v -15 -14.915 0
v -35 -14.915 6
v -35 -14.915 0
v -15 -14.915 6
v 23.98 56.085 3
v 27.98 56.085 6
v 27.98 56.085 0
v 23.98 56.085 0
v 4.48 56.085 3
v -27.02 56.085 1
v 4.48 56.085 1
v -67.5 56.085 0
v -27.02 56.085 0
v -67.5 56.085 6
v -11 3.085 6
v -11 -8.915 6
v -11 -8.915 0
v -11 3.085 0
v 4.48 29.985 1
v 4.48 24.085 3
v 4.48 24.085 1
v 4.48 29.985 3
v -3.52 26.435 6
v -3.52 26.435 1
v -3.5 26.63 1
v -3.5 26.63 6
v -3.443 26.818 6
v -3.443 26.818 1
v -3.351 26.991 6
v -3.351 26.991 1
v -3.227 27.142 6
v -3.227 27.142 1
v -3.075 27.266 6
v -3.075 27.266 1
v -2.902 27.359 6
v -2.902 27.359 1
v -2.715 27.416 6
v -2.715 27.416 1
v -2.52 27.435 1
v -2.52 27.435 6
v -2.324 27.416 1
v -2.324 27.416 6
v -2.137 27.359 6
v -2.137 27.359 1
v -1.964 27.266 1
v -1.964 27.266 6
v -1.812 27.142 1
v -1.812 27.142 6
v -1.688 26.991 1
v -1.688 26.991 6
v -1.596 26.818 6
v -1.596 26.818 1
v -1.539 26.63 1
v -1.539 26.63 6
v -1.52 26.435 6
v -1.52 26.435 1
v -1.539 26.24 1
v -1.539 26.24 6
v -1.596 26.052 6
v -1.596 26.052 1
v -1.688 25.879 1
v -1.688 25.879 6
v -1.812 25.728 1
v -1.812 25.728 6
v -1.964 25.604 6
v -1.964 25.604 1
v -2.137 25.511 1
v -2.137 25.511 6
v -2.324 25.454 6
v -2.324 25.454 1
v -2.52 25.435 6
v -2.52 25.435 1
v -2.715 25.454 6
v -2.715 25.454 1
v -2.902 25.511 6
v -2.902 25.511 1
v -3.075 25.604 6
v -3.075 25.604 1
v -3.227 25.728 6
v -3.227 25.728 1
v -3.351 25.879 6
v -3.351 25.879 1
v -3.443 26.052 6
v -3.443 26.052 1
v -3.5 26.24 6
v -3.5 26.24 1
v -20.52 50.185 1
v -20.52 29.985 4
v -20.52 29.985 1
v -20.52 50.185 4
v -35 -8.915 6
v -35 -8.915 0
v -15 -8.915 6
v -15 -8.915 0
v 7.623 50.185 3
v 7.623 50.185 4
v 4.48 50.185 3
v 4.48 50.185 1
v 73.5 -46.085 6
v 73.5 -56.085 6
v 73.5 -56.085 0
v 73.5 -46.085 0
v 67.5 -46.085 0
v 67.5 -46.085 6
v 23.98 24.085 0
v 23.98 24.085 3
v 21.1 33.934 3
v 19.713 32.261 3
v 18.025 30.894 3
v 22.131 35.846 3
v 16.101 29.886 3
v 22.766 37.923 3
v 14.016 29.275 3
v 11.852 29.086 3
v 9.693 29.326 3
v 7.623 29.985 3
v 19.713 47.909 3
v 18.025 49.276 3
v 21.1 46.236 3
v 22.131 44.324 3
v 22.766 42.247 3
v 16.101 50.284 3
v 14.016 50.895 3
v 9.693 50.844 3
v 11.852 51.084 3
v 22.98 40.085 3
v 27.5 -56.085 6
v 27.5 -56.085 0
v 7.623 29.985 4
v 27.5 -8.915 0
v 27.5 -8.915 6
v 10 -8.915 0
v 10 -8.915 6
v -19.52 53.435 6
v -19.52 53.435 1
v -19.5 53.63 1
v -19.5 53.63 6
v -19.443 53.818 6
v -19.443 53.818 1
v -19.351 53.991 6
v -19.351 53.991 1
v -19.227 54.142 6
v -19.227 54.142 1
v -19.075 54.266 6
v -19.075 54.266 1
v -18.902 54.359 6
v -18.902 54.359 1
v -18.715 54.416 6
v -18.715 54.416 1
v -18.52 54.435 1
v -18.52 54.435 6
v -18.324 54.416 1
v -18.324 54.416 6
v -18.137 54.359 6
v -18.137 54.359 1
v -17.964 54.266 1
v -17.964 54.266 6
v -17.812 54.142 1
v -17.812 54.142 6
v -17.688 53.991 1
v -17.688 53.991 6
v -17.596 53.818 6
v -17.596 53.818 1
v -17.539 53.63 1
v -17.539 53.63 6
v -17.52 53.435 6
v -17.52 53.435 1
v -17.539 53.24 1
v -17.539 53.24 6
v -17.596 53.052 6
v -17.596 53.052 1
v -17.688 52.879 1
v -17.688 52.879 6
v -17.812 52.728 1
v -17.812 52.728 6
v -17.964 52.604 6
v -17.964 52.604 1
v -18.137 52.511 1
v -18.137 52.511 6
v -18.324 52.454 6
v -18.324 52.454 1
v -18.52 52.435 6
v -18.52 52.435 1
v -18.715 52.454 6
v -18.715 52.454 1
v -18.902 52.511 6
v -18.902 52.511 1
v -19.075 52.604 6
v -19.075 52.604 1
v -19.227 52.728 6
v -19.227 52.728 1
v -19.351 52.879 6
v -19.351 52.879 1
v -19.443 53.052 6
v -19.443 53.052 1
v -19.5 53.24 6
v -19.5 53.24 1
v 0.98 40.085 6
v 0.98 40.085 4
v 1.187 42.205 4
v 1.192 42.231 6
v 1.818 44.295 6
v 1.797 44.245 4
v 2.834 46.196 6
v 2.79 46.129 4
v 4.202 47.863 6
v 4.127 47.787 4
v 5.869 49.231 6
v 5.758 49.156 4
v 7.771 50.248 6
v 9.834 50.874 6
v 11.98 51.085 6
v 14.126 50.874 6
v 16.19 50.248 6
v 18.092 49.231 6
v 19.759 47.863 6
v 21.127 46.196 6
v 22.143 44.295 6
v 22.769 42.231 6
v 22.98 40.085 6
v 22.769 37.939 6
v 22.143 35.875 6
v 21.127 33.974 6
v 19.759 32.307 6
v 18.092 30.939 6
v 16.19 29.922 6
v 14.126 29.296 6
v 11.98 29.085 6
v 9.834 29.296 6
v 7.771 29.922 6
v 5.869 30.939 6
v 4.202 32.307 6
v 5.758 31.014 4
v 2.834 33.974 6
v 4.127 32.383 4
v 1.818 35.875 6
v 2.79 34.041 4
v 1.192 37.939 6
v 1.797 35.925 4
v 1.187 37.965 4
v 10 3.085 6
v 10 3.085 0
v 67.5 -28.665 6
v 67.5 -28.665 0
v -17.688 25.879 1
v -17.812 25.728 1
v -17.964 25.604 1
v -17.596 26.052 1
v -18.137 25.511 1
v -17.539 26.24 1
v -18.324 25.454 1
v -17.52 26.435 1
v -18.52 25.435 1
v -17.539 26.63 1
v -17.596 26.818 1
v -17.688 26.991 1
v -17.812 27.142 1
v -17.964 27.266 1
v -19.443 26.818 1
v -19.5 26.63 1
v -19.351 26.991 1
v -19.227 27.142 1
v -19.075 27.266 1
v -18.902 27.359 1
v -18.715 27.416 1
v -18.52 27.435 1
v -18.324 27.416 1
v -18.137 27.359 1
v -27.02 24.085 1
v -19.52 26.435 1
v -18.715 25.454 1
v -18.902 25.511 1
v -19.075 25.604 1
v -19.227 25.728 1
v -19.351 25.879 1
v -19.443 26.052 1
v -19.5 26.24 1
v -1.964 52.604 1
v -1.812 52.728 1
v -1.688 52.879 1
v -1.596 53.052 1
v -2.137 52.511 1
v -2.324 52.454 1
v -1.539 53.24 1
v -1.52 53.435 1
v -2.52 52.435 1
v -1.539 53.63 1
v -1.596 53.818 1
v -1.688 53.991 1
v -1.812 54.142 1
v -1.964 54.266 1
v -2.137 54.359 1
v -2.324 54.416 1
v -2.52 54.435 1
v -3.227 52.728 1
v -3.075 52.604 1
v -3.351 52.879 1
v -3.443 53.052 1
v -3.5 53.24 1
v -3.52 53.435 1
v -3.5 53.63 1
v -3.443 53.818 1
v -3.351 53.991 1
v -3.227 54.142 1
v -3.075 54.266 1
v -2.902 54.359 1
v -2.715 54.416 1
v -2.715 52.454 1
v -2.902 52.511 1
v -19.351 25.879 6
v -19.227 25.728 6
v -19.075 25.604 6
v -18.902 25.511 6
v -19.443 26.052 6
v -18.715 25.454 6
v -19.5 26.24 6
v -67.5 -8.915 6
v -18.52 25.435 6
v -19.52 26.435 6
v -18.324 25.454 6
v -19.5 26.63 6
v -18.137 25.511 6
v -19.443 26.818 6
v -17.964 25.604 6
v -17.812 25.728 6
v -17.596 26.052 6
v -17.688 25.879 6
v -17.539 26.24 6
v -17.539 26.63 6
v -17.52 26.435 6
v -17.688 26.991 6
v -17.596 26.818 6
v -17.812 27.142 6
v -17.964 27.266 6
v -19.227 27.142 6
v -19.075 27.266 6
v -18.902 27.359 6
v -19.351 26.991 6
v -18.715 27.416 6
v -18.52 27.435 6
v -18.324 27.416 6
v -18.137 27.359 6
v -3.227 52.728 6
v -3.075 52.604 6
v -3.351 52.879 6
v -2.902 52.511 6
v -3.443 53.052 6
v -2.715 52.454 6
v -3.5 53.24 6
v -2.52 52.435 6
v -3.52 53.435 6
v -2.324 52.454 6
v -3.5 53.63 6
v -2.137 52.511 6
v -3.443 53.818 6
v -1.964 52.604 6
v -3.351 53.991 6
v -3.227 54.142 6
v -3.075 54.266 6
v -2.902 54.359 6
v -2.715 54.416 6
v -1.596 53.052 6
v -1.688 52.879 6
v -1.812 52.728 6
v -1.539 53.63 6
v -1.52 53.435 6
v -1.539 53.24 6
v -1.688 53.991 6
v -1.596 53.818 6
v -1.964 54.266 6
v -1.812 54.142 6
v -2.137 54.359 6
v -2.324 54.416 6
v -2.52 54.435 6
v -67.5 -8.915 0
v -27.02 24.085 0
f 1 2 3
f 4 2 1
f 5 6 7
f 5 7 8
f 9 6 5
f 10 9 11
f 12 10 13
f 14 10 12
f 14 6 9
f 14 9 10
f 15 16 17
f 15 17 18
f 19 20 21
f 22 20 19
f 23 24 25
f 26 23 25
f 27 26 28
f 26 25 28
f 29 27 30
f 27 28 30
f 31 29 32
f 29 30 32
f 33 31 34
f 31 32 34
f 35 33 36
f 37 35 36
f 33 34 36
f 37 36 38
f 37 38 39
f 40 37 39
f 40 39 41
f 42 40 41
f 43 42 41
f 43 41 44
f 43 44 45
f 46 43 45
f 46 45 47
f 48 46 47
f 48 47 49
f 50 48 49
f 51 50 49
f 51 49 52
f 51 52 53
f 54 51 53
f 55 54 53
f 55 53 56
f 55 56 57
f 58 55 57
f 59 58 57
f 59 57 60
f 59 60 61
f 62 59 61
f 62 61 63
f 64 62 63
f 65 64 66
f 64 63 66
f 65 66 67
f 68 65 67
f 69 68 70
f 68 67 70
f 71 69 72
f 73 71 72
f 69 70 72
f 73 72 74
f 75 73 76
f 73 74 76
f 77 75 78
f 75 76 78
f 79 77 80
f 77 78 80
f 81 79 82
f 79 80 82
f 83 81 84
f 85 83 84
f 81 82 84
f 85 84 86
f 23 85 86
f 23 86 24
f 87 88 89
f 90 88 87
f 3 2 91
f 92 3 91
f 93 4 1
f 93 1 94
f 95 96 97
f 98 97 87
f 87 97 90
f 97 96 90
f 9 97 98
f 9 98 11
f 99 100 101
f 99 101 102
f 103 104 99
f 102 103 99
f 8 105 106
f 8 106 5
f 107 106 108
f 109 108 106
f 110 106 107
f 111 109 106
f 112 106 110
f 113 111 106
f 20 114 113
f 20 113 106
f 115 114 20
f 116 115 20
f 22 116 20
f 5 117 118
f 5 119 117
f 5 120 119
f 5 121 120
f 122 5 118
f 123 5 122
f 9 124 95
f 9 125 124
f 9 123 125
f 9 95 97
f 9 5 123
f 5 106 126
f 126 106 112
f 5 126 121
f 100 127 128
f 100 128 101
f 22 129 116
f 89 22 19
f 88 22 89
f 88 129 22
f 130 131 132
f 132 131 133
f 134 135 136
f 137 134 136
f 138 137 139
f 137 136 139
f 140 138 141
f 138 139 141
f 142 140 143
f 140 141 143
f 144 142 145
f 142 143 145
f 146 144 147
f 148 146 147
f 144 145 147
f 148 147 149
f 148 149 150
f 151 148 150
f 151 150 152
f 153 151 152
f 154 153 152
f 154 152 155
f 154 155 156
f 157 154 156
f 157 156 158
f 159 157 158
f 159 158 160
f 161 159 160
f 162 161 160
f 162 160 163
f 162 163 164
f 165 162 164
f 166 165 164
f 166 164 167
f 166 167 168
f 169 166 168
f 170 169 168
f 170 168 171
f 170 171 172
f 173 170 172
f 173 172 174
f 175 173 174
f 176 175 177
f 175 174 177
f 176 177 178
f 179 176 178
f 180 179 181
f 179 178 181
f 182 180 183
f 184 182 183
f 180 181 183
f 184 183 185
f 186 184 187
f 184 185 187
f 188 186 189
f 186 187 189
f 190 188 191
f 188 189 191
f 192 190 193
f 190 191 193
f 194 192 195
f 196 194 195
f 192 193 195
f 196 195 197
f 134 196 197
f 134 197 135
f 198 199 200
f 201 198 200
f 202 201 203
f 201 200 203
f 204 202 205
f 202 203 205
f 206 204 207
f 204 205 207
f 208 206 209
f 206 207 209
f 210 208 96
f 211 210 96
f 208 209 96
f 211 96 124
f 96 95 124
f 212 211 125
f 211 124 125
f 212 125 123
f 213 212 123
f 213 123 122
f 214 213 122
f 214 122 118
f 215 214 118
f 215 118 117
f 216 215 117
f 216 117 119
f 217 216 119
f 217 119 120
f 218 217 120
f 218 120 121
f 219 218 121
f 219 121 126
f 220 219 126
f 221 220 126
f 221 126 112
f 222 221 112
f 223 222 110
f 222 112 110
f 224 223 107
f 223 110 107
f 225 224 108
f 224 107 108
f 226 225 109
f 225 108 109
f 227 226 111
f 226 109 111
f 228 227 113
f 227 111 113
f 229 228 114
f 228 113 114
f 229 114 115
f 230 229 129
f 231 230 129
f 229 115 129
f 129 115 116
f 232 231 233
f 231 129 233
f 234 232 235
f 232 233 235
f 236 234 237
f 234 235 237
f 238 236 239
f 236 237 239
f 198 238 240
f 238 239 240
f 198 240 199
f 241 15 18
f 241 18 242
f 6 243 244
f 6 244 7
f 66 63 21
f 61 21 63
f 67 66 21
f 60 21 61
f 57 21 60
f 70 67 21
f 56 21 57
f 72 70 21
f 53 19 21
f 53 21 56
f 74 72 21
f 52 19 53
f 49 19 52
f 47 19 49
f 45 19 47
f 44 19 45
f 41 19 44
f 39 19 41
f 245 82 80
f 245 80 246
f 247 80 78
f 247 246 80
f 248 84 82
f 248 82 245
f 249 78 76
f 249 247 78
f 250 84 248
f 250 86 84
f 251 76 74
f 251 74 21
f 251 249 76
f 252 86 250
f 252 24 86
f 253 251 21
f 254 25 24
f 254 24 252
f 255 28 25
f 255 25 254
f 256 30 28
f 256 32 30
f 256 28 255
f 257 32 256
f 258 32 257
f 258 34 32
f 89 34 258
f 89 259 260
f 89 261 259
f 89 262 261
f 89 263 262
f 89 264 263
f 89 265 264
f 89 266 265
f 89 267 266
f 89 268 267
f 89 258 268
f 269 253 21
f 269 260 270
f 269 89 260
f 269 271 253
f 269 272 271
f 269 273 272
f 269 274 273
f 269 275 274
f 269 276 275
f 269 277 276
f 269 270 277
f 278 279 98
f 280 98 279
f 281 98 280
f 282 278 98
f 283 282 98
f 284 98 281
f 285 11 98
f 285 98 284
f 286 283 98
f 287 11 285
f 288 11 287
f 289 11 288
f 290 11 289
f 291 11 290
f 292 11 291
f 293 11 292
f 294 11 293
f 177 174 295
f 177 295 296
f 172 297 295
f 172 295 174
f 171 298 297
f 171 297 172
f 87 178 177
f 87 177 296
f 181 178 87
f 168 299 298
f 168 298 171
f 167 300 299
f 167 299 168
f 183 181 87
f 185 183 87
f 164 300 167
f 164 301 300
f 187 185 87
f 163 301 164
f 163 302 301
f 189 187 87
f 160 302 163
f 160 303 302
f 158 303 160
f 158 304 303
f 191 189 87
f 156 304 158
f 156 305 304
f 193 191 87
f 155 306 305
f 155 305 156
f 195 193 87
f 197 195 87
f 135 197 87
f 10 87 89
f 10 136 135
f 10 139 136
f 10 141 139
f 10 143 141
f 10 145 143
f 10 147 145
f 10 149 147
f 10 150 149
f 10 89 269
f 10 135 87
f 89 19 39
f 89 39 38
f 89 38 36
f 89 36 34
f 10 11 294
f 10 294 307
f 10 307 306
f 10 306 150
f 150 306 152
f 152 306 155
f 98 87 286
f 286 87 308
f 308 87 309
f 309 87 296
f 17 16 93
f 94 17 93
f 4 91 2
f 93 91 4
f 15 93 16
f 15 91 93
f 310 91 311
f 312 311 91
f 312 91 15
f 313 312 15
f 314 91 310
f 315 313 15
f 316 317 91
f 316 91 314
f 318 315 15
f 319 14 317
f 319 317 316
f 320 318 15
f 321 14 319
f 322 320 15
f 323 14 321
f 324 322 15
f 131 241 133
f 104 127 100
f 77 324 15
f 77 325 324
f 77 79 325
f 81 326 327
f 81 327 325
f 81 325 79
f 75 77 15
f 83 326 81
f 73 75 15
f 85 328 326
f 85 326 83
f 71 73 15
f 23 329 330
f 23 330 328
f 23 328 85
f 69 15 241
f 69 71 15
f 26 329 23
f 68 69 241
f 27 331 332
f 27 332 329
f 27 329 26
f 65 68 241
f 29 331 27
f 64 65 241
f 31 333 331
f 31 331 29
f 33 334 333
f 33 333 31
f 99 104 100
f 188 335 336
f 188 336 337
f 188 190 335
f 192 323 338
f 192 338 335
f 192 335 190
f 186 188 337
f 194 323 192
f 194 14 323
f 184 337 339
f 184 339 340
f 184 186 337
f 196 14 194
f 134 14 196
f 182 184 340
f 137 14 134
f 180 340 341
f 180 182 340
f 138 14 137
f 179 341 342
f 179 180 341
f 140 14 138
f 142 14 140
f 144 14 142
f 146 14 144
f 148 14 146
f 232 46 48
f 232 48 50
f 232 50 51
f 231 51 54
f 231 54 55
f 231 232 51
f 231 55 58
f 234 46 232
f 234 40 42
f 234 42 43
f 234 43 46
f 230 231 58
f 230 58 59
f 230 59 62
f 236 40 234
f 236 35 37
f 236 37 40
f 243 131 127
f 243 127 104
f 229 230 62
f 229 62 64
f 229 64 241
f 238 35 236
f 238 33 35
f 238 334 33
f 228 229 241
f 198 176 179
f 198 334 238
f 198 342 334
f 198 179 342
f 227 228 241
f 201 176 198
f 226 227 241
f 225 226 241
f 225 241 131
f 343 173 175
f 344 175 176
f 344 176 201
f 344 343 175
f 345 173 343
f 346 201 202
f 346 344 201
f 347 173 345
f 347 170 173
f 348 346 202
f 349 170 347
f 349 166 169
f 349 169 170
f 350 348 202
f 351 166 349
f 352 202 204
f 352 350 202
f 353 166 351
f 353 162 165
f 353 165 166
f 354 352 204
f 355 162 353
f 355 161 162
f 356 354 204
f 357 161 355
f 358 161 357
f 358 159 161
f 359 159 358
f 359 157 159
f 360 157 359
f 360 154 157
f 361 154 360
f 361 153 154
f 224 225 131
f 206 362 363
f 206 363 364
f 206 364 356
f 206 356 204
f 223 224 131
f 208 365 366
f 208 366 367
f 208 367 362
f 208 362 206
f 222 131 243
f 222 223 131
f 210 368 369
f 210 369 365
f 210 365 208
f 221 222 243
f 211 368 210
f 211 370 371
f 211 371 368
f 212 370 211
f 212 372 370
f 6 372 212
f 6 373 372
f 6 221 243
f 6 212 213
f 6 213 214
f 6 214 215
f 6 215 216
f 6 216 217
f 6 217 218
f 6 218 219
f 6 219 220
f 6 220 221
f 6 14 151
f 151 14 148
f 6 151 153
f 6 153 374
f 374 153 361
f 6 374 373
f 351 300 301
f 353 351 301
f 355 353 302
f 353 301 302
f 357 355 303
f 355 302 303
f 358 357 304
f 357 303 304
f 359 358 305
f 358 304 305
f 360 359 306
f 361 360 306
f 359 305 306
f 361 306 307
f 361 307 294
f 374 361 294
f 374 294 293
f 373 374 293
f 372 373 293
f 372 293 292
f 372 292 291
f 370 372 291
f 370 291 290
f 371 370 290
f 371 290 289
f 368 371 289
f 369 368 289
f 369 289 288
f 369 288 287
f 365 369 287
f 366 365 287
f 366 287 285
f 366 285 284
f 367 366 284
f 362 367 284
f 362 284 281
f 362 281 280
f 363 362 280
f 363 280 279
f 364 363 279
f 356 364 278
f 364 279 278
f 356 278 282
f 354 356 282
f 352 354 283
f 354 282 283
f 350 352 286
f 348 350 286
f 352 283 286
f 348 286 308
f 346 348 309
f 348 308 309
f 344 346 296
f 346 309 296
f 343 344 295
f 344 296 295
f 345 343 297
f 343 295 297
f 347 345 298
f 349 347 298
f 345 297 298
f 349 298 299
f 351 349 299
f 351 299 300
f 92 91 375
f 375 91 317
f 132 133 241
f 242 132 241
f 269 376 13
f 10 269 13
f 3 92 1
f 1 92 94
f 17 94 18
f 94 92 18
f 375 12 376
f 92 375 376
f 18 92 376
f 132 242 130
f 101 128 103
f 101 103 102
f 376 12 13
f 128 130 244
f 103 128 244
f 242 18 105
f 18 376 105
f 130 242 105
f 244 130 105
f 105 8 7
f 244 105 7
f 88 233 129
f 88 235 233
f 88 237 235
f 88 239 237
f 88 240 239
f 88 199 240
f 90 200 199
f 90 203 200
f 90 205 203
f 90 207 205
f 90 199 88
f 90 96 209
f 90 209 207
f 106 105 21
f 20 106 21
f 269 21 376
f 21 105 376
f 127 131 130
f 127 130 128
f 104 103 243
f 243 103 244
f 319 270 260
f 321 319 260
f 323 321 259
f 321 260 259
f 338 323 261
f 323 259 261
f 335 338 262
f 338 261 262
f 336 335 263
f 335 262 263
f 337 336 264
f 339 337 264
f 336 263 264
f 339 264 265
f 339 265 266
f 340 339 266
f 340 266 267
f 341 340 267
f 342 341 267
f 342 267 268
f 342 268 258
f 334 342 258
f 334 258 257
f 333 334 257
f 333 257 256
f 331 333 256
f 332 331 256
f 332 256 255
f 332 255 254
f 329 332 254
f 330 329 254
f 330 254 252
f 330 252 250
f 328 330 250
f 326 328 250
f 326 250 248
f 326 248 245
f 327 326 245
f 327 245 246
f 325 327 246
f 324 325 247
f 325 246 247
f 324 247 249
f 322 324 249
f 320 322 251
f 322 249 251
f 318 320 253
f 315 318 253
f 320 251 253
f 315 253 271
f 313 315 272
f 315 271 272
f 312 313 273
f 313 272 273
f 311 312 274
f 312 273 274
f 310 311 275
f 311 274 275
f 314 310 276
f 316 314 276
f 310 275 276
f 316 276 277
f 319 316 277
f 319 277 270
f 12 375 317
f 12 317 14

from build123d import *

# Parameters (mm, degrees)
ESQUISSE1_W             = 135
ESQUISSE1_H             = 112.17
BOSS_EXTRU_1_DEPTH      = 6
ENL_V_MAT_EXTRU_1_DEPTH = 6
ESQUISSE3_W             = 6
ESQUISSE3_H             = 10
ESQUISSE3_W_2           = 20
ESQUISSE3_H_2           = 6
BOSS_EXTRU_2_DEPTH      = 6
ESQUISSE4_W             = 51
ESQUISSE4_H             = 32
ENL_V_MAT_EXTRU_5_DEPTH = 3
ESQUISSE7_R             = 11
ENL_V_MAT_EXTRU_6_DEPTH = 4
ESQUISSE8_W             = 30
ESQUISSE8_H             = 20.2
ENL_V_MAT_EXTRU_7_DEPTH = 1
ESQUISSE9_W             = 25
ESQUISSE9_H             = 5.9
BOSS_EXTRU_4_DEPTH      = 2
ESQUISSE10_W            = 25
ESQUISSE10_H            = 5.9
BOSS_EXTRU_5_DEPTH      = 2
ESQUISSE11_W            = 6.5
ESQUISSE11_H            = 32
BOSS_EXTRU_6_DEPTH      = 2
ESQUISSE12_R            = 1
ENL_V_MAT_EXTRU_8_DEPTH = 6
ESQUISSE13_W            = 21
ESQUISSE13_H            = 12
ENL_V_MAT_EXTRU_9_DEPTH = 6


with BuildPart() as part:
    # Esquisse1 → Boss.-Extru.1 (new body)
    with BuildSketch(Plane.XY):
        Rectangle(ESQUISSE1_W, ESQUISSE1_H)
    extrude(amount=BOSS_EXTRU_1_DEPTH)

    # Esquisse2 → Enlèv. mat.-Extru.1 (cut)
    with BuildSketch(Plane.XY.offset(6)):
        Polygon((27.5, -56.085), (-67.5, -56.085), (-67.5, -8.915), (-38.5, -8.915), (27.5, -8.915), align=None)
        Polygon((67.5, -28.665), (27.980425971, 56.085), (67.5, 56.085), align=None)
    extrude(amount=-ENL_V_MAT_EXTRU_1_DEPTH, mode=Mode.SUBTRACT)

    # Esquisse3 → Boss.-Extru.2 (add)
    with BuildSketch(Plane.XY.offset(6)):
        with Locations((70.5, -51.085)):
            Rectangle(ESQUISSE3_W, ESQUISSE3_H)
        with Locations((-25, -11.915)):
            Rectangle(ESQUISSE3_W_2, ESQUISSE3_H_2)
    extrude(amount=-BOSS_EXTRU_2_DEPTH)

    # Esquisse4 → Enlèv. mat.-Extru.5 (cut)
    with BuildSketch(Plane(origin=(0, 0, 0), x_dir=(-1, 0, 0), z_dir=(0, 0, -1))):
        with Locations((1.519574029, 40.085)):
            Rectangle(ESQUISSE4_W, ESQUISSE4_H)
    extrude(amount=-ENL_V_MAT_EXTRU_5_DEPTH, mode=Mode.SUBTRACT)

    # Esquisse7 → Enlèv. mat.-Extru.6 (cut, through all)
    with BuildSketch(Plane(origin=(0, 0, 3), x_dir=(-1, 0, 0), z_dir=(0, 0, -1))):
        with Locations((-11.980425971, 40.085)):
            Circle(ESQUISSE7_R)
    extrude(amount=-ENL_V_MAT_EXTRU_6_DEPTH, mode=Mode.SUBTRACT)

    # Esquisse8 → Enlèv. mat.-Extru.7 (cut)
    with BuildSketch(Plane(origin=(0, 0, 3), x_dir=(-1, 0, 0), z_dir=(0, 0, -1))):
        with Locations((5.519574029, 40.085)):
            Rectangle(ESQUISSE8_W, ESQUISSE8_H)
    extrude(amount=-ENL_V_MAT_EXTRU_7_DEPTH, mode=Mode.SUBTRACT)

    # Esquisse9 → Boss.-Extru.4 (add)
    with BuildSketch(Plane(origin=(0, 0, 3), x_dir=(-1, 0, 0), z_dir=(0, 0, -1))):
        with Locations((8.019574029, 53.135)):
            Rectangle(ESQUISSE9_W, ESQUISSE9_H)
    extrude(amount=BOSS_EXTRU_4_DEPTH)

    # Esquisse10 → Boss.-Extru.5 (add)
    with BuildSketch(Plane(origin=(0, 0, 3), x_dir=(-1, 0, 0), z_dir=(0, 0, -1))):
        with Locations((8.019574029, 27.035)):
            Rectangle(ESQUISSE10_W, ESQUISSE10_H)
    extrude(amount=BOSS_EXTRU_5_DEPTH)

    # Esquisse11 → Boss.-Extru.6 (add)
    with BuildSketch(Plane(origin=(0, 0, 3), x_dir=(-1, 0, 0), z_dir=(0, 0, -1))):
        with Locations((23.769574029, 40.085)):
            Rectangle(ESQUISSE11_W, ESQUISSE11_H)
    extrude(amount=BOSS_EXTRU_6_DEPTH)

    # Esquisse12 → Enlèv. mat.-Extru.8 (cut, through all)
    with BuildSketch(Plane(origin=(0, 0, 1), x_dir=(-1, 0, 0), z_dir=(0, 0, -1))):
        with Locations((2.519574029, 53.435)):
            Circle(ESQUISSE12_R)
        with Locations((18.519574029, 53.435)):
            Circle(ESQUISSE12_R)
        with Locations((2.519574029, 26.435)):
            Circle(ESQUISSE12_R)
        with Locations((18.519574029, 26.435)):
            Circle(ESQUISSE12_R)
    extrude(amount=-ENL_V_MAT_EXTRU_8_DEPTH, mode=Mode.SUBTRACT)

    # Esquisse13 → Enlèv. mat.-Extru.9 (cut)
    with BuildSketch(Plane.XY.offset(6)):
        with Locations((-0.5, -2.915)):
            Rectangle(ESQUISSE13_W, ESQUISSE13_H)
    extrude(amount=-ENL_V_MAT_EXTRU_9_DEPTH, mode=Mode.SUBTRACT)


solid = part.part
